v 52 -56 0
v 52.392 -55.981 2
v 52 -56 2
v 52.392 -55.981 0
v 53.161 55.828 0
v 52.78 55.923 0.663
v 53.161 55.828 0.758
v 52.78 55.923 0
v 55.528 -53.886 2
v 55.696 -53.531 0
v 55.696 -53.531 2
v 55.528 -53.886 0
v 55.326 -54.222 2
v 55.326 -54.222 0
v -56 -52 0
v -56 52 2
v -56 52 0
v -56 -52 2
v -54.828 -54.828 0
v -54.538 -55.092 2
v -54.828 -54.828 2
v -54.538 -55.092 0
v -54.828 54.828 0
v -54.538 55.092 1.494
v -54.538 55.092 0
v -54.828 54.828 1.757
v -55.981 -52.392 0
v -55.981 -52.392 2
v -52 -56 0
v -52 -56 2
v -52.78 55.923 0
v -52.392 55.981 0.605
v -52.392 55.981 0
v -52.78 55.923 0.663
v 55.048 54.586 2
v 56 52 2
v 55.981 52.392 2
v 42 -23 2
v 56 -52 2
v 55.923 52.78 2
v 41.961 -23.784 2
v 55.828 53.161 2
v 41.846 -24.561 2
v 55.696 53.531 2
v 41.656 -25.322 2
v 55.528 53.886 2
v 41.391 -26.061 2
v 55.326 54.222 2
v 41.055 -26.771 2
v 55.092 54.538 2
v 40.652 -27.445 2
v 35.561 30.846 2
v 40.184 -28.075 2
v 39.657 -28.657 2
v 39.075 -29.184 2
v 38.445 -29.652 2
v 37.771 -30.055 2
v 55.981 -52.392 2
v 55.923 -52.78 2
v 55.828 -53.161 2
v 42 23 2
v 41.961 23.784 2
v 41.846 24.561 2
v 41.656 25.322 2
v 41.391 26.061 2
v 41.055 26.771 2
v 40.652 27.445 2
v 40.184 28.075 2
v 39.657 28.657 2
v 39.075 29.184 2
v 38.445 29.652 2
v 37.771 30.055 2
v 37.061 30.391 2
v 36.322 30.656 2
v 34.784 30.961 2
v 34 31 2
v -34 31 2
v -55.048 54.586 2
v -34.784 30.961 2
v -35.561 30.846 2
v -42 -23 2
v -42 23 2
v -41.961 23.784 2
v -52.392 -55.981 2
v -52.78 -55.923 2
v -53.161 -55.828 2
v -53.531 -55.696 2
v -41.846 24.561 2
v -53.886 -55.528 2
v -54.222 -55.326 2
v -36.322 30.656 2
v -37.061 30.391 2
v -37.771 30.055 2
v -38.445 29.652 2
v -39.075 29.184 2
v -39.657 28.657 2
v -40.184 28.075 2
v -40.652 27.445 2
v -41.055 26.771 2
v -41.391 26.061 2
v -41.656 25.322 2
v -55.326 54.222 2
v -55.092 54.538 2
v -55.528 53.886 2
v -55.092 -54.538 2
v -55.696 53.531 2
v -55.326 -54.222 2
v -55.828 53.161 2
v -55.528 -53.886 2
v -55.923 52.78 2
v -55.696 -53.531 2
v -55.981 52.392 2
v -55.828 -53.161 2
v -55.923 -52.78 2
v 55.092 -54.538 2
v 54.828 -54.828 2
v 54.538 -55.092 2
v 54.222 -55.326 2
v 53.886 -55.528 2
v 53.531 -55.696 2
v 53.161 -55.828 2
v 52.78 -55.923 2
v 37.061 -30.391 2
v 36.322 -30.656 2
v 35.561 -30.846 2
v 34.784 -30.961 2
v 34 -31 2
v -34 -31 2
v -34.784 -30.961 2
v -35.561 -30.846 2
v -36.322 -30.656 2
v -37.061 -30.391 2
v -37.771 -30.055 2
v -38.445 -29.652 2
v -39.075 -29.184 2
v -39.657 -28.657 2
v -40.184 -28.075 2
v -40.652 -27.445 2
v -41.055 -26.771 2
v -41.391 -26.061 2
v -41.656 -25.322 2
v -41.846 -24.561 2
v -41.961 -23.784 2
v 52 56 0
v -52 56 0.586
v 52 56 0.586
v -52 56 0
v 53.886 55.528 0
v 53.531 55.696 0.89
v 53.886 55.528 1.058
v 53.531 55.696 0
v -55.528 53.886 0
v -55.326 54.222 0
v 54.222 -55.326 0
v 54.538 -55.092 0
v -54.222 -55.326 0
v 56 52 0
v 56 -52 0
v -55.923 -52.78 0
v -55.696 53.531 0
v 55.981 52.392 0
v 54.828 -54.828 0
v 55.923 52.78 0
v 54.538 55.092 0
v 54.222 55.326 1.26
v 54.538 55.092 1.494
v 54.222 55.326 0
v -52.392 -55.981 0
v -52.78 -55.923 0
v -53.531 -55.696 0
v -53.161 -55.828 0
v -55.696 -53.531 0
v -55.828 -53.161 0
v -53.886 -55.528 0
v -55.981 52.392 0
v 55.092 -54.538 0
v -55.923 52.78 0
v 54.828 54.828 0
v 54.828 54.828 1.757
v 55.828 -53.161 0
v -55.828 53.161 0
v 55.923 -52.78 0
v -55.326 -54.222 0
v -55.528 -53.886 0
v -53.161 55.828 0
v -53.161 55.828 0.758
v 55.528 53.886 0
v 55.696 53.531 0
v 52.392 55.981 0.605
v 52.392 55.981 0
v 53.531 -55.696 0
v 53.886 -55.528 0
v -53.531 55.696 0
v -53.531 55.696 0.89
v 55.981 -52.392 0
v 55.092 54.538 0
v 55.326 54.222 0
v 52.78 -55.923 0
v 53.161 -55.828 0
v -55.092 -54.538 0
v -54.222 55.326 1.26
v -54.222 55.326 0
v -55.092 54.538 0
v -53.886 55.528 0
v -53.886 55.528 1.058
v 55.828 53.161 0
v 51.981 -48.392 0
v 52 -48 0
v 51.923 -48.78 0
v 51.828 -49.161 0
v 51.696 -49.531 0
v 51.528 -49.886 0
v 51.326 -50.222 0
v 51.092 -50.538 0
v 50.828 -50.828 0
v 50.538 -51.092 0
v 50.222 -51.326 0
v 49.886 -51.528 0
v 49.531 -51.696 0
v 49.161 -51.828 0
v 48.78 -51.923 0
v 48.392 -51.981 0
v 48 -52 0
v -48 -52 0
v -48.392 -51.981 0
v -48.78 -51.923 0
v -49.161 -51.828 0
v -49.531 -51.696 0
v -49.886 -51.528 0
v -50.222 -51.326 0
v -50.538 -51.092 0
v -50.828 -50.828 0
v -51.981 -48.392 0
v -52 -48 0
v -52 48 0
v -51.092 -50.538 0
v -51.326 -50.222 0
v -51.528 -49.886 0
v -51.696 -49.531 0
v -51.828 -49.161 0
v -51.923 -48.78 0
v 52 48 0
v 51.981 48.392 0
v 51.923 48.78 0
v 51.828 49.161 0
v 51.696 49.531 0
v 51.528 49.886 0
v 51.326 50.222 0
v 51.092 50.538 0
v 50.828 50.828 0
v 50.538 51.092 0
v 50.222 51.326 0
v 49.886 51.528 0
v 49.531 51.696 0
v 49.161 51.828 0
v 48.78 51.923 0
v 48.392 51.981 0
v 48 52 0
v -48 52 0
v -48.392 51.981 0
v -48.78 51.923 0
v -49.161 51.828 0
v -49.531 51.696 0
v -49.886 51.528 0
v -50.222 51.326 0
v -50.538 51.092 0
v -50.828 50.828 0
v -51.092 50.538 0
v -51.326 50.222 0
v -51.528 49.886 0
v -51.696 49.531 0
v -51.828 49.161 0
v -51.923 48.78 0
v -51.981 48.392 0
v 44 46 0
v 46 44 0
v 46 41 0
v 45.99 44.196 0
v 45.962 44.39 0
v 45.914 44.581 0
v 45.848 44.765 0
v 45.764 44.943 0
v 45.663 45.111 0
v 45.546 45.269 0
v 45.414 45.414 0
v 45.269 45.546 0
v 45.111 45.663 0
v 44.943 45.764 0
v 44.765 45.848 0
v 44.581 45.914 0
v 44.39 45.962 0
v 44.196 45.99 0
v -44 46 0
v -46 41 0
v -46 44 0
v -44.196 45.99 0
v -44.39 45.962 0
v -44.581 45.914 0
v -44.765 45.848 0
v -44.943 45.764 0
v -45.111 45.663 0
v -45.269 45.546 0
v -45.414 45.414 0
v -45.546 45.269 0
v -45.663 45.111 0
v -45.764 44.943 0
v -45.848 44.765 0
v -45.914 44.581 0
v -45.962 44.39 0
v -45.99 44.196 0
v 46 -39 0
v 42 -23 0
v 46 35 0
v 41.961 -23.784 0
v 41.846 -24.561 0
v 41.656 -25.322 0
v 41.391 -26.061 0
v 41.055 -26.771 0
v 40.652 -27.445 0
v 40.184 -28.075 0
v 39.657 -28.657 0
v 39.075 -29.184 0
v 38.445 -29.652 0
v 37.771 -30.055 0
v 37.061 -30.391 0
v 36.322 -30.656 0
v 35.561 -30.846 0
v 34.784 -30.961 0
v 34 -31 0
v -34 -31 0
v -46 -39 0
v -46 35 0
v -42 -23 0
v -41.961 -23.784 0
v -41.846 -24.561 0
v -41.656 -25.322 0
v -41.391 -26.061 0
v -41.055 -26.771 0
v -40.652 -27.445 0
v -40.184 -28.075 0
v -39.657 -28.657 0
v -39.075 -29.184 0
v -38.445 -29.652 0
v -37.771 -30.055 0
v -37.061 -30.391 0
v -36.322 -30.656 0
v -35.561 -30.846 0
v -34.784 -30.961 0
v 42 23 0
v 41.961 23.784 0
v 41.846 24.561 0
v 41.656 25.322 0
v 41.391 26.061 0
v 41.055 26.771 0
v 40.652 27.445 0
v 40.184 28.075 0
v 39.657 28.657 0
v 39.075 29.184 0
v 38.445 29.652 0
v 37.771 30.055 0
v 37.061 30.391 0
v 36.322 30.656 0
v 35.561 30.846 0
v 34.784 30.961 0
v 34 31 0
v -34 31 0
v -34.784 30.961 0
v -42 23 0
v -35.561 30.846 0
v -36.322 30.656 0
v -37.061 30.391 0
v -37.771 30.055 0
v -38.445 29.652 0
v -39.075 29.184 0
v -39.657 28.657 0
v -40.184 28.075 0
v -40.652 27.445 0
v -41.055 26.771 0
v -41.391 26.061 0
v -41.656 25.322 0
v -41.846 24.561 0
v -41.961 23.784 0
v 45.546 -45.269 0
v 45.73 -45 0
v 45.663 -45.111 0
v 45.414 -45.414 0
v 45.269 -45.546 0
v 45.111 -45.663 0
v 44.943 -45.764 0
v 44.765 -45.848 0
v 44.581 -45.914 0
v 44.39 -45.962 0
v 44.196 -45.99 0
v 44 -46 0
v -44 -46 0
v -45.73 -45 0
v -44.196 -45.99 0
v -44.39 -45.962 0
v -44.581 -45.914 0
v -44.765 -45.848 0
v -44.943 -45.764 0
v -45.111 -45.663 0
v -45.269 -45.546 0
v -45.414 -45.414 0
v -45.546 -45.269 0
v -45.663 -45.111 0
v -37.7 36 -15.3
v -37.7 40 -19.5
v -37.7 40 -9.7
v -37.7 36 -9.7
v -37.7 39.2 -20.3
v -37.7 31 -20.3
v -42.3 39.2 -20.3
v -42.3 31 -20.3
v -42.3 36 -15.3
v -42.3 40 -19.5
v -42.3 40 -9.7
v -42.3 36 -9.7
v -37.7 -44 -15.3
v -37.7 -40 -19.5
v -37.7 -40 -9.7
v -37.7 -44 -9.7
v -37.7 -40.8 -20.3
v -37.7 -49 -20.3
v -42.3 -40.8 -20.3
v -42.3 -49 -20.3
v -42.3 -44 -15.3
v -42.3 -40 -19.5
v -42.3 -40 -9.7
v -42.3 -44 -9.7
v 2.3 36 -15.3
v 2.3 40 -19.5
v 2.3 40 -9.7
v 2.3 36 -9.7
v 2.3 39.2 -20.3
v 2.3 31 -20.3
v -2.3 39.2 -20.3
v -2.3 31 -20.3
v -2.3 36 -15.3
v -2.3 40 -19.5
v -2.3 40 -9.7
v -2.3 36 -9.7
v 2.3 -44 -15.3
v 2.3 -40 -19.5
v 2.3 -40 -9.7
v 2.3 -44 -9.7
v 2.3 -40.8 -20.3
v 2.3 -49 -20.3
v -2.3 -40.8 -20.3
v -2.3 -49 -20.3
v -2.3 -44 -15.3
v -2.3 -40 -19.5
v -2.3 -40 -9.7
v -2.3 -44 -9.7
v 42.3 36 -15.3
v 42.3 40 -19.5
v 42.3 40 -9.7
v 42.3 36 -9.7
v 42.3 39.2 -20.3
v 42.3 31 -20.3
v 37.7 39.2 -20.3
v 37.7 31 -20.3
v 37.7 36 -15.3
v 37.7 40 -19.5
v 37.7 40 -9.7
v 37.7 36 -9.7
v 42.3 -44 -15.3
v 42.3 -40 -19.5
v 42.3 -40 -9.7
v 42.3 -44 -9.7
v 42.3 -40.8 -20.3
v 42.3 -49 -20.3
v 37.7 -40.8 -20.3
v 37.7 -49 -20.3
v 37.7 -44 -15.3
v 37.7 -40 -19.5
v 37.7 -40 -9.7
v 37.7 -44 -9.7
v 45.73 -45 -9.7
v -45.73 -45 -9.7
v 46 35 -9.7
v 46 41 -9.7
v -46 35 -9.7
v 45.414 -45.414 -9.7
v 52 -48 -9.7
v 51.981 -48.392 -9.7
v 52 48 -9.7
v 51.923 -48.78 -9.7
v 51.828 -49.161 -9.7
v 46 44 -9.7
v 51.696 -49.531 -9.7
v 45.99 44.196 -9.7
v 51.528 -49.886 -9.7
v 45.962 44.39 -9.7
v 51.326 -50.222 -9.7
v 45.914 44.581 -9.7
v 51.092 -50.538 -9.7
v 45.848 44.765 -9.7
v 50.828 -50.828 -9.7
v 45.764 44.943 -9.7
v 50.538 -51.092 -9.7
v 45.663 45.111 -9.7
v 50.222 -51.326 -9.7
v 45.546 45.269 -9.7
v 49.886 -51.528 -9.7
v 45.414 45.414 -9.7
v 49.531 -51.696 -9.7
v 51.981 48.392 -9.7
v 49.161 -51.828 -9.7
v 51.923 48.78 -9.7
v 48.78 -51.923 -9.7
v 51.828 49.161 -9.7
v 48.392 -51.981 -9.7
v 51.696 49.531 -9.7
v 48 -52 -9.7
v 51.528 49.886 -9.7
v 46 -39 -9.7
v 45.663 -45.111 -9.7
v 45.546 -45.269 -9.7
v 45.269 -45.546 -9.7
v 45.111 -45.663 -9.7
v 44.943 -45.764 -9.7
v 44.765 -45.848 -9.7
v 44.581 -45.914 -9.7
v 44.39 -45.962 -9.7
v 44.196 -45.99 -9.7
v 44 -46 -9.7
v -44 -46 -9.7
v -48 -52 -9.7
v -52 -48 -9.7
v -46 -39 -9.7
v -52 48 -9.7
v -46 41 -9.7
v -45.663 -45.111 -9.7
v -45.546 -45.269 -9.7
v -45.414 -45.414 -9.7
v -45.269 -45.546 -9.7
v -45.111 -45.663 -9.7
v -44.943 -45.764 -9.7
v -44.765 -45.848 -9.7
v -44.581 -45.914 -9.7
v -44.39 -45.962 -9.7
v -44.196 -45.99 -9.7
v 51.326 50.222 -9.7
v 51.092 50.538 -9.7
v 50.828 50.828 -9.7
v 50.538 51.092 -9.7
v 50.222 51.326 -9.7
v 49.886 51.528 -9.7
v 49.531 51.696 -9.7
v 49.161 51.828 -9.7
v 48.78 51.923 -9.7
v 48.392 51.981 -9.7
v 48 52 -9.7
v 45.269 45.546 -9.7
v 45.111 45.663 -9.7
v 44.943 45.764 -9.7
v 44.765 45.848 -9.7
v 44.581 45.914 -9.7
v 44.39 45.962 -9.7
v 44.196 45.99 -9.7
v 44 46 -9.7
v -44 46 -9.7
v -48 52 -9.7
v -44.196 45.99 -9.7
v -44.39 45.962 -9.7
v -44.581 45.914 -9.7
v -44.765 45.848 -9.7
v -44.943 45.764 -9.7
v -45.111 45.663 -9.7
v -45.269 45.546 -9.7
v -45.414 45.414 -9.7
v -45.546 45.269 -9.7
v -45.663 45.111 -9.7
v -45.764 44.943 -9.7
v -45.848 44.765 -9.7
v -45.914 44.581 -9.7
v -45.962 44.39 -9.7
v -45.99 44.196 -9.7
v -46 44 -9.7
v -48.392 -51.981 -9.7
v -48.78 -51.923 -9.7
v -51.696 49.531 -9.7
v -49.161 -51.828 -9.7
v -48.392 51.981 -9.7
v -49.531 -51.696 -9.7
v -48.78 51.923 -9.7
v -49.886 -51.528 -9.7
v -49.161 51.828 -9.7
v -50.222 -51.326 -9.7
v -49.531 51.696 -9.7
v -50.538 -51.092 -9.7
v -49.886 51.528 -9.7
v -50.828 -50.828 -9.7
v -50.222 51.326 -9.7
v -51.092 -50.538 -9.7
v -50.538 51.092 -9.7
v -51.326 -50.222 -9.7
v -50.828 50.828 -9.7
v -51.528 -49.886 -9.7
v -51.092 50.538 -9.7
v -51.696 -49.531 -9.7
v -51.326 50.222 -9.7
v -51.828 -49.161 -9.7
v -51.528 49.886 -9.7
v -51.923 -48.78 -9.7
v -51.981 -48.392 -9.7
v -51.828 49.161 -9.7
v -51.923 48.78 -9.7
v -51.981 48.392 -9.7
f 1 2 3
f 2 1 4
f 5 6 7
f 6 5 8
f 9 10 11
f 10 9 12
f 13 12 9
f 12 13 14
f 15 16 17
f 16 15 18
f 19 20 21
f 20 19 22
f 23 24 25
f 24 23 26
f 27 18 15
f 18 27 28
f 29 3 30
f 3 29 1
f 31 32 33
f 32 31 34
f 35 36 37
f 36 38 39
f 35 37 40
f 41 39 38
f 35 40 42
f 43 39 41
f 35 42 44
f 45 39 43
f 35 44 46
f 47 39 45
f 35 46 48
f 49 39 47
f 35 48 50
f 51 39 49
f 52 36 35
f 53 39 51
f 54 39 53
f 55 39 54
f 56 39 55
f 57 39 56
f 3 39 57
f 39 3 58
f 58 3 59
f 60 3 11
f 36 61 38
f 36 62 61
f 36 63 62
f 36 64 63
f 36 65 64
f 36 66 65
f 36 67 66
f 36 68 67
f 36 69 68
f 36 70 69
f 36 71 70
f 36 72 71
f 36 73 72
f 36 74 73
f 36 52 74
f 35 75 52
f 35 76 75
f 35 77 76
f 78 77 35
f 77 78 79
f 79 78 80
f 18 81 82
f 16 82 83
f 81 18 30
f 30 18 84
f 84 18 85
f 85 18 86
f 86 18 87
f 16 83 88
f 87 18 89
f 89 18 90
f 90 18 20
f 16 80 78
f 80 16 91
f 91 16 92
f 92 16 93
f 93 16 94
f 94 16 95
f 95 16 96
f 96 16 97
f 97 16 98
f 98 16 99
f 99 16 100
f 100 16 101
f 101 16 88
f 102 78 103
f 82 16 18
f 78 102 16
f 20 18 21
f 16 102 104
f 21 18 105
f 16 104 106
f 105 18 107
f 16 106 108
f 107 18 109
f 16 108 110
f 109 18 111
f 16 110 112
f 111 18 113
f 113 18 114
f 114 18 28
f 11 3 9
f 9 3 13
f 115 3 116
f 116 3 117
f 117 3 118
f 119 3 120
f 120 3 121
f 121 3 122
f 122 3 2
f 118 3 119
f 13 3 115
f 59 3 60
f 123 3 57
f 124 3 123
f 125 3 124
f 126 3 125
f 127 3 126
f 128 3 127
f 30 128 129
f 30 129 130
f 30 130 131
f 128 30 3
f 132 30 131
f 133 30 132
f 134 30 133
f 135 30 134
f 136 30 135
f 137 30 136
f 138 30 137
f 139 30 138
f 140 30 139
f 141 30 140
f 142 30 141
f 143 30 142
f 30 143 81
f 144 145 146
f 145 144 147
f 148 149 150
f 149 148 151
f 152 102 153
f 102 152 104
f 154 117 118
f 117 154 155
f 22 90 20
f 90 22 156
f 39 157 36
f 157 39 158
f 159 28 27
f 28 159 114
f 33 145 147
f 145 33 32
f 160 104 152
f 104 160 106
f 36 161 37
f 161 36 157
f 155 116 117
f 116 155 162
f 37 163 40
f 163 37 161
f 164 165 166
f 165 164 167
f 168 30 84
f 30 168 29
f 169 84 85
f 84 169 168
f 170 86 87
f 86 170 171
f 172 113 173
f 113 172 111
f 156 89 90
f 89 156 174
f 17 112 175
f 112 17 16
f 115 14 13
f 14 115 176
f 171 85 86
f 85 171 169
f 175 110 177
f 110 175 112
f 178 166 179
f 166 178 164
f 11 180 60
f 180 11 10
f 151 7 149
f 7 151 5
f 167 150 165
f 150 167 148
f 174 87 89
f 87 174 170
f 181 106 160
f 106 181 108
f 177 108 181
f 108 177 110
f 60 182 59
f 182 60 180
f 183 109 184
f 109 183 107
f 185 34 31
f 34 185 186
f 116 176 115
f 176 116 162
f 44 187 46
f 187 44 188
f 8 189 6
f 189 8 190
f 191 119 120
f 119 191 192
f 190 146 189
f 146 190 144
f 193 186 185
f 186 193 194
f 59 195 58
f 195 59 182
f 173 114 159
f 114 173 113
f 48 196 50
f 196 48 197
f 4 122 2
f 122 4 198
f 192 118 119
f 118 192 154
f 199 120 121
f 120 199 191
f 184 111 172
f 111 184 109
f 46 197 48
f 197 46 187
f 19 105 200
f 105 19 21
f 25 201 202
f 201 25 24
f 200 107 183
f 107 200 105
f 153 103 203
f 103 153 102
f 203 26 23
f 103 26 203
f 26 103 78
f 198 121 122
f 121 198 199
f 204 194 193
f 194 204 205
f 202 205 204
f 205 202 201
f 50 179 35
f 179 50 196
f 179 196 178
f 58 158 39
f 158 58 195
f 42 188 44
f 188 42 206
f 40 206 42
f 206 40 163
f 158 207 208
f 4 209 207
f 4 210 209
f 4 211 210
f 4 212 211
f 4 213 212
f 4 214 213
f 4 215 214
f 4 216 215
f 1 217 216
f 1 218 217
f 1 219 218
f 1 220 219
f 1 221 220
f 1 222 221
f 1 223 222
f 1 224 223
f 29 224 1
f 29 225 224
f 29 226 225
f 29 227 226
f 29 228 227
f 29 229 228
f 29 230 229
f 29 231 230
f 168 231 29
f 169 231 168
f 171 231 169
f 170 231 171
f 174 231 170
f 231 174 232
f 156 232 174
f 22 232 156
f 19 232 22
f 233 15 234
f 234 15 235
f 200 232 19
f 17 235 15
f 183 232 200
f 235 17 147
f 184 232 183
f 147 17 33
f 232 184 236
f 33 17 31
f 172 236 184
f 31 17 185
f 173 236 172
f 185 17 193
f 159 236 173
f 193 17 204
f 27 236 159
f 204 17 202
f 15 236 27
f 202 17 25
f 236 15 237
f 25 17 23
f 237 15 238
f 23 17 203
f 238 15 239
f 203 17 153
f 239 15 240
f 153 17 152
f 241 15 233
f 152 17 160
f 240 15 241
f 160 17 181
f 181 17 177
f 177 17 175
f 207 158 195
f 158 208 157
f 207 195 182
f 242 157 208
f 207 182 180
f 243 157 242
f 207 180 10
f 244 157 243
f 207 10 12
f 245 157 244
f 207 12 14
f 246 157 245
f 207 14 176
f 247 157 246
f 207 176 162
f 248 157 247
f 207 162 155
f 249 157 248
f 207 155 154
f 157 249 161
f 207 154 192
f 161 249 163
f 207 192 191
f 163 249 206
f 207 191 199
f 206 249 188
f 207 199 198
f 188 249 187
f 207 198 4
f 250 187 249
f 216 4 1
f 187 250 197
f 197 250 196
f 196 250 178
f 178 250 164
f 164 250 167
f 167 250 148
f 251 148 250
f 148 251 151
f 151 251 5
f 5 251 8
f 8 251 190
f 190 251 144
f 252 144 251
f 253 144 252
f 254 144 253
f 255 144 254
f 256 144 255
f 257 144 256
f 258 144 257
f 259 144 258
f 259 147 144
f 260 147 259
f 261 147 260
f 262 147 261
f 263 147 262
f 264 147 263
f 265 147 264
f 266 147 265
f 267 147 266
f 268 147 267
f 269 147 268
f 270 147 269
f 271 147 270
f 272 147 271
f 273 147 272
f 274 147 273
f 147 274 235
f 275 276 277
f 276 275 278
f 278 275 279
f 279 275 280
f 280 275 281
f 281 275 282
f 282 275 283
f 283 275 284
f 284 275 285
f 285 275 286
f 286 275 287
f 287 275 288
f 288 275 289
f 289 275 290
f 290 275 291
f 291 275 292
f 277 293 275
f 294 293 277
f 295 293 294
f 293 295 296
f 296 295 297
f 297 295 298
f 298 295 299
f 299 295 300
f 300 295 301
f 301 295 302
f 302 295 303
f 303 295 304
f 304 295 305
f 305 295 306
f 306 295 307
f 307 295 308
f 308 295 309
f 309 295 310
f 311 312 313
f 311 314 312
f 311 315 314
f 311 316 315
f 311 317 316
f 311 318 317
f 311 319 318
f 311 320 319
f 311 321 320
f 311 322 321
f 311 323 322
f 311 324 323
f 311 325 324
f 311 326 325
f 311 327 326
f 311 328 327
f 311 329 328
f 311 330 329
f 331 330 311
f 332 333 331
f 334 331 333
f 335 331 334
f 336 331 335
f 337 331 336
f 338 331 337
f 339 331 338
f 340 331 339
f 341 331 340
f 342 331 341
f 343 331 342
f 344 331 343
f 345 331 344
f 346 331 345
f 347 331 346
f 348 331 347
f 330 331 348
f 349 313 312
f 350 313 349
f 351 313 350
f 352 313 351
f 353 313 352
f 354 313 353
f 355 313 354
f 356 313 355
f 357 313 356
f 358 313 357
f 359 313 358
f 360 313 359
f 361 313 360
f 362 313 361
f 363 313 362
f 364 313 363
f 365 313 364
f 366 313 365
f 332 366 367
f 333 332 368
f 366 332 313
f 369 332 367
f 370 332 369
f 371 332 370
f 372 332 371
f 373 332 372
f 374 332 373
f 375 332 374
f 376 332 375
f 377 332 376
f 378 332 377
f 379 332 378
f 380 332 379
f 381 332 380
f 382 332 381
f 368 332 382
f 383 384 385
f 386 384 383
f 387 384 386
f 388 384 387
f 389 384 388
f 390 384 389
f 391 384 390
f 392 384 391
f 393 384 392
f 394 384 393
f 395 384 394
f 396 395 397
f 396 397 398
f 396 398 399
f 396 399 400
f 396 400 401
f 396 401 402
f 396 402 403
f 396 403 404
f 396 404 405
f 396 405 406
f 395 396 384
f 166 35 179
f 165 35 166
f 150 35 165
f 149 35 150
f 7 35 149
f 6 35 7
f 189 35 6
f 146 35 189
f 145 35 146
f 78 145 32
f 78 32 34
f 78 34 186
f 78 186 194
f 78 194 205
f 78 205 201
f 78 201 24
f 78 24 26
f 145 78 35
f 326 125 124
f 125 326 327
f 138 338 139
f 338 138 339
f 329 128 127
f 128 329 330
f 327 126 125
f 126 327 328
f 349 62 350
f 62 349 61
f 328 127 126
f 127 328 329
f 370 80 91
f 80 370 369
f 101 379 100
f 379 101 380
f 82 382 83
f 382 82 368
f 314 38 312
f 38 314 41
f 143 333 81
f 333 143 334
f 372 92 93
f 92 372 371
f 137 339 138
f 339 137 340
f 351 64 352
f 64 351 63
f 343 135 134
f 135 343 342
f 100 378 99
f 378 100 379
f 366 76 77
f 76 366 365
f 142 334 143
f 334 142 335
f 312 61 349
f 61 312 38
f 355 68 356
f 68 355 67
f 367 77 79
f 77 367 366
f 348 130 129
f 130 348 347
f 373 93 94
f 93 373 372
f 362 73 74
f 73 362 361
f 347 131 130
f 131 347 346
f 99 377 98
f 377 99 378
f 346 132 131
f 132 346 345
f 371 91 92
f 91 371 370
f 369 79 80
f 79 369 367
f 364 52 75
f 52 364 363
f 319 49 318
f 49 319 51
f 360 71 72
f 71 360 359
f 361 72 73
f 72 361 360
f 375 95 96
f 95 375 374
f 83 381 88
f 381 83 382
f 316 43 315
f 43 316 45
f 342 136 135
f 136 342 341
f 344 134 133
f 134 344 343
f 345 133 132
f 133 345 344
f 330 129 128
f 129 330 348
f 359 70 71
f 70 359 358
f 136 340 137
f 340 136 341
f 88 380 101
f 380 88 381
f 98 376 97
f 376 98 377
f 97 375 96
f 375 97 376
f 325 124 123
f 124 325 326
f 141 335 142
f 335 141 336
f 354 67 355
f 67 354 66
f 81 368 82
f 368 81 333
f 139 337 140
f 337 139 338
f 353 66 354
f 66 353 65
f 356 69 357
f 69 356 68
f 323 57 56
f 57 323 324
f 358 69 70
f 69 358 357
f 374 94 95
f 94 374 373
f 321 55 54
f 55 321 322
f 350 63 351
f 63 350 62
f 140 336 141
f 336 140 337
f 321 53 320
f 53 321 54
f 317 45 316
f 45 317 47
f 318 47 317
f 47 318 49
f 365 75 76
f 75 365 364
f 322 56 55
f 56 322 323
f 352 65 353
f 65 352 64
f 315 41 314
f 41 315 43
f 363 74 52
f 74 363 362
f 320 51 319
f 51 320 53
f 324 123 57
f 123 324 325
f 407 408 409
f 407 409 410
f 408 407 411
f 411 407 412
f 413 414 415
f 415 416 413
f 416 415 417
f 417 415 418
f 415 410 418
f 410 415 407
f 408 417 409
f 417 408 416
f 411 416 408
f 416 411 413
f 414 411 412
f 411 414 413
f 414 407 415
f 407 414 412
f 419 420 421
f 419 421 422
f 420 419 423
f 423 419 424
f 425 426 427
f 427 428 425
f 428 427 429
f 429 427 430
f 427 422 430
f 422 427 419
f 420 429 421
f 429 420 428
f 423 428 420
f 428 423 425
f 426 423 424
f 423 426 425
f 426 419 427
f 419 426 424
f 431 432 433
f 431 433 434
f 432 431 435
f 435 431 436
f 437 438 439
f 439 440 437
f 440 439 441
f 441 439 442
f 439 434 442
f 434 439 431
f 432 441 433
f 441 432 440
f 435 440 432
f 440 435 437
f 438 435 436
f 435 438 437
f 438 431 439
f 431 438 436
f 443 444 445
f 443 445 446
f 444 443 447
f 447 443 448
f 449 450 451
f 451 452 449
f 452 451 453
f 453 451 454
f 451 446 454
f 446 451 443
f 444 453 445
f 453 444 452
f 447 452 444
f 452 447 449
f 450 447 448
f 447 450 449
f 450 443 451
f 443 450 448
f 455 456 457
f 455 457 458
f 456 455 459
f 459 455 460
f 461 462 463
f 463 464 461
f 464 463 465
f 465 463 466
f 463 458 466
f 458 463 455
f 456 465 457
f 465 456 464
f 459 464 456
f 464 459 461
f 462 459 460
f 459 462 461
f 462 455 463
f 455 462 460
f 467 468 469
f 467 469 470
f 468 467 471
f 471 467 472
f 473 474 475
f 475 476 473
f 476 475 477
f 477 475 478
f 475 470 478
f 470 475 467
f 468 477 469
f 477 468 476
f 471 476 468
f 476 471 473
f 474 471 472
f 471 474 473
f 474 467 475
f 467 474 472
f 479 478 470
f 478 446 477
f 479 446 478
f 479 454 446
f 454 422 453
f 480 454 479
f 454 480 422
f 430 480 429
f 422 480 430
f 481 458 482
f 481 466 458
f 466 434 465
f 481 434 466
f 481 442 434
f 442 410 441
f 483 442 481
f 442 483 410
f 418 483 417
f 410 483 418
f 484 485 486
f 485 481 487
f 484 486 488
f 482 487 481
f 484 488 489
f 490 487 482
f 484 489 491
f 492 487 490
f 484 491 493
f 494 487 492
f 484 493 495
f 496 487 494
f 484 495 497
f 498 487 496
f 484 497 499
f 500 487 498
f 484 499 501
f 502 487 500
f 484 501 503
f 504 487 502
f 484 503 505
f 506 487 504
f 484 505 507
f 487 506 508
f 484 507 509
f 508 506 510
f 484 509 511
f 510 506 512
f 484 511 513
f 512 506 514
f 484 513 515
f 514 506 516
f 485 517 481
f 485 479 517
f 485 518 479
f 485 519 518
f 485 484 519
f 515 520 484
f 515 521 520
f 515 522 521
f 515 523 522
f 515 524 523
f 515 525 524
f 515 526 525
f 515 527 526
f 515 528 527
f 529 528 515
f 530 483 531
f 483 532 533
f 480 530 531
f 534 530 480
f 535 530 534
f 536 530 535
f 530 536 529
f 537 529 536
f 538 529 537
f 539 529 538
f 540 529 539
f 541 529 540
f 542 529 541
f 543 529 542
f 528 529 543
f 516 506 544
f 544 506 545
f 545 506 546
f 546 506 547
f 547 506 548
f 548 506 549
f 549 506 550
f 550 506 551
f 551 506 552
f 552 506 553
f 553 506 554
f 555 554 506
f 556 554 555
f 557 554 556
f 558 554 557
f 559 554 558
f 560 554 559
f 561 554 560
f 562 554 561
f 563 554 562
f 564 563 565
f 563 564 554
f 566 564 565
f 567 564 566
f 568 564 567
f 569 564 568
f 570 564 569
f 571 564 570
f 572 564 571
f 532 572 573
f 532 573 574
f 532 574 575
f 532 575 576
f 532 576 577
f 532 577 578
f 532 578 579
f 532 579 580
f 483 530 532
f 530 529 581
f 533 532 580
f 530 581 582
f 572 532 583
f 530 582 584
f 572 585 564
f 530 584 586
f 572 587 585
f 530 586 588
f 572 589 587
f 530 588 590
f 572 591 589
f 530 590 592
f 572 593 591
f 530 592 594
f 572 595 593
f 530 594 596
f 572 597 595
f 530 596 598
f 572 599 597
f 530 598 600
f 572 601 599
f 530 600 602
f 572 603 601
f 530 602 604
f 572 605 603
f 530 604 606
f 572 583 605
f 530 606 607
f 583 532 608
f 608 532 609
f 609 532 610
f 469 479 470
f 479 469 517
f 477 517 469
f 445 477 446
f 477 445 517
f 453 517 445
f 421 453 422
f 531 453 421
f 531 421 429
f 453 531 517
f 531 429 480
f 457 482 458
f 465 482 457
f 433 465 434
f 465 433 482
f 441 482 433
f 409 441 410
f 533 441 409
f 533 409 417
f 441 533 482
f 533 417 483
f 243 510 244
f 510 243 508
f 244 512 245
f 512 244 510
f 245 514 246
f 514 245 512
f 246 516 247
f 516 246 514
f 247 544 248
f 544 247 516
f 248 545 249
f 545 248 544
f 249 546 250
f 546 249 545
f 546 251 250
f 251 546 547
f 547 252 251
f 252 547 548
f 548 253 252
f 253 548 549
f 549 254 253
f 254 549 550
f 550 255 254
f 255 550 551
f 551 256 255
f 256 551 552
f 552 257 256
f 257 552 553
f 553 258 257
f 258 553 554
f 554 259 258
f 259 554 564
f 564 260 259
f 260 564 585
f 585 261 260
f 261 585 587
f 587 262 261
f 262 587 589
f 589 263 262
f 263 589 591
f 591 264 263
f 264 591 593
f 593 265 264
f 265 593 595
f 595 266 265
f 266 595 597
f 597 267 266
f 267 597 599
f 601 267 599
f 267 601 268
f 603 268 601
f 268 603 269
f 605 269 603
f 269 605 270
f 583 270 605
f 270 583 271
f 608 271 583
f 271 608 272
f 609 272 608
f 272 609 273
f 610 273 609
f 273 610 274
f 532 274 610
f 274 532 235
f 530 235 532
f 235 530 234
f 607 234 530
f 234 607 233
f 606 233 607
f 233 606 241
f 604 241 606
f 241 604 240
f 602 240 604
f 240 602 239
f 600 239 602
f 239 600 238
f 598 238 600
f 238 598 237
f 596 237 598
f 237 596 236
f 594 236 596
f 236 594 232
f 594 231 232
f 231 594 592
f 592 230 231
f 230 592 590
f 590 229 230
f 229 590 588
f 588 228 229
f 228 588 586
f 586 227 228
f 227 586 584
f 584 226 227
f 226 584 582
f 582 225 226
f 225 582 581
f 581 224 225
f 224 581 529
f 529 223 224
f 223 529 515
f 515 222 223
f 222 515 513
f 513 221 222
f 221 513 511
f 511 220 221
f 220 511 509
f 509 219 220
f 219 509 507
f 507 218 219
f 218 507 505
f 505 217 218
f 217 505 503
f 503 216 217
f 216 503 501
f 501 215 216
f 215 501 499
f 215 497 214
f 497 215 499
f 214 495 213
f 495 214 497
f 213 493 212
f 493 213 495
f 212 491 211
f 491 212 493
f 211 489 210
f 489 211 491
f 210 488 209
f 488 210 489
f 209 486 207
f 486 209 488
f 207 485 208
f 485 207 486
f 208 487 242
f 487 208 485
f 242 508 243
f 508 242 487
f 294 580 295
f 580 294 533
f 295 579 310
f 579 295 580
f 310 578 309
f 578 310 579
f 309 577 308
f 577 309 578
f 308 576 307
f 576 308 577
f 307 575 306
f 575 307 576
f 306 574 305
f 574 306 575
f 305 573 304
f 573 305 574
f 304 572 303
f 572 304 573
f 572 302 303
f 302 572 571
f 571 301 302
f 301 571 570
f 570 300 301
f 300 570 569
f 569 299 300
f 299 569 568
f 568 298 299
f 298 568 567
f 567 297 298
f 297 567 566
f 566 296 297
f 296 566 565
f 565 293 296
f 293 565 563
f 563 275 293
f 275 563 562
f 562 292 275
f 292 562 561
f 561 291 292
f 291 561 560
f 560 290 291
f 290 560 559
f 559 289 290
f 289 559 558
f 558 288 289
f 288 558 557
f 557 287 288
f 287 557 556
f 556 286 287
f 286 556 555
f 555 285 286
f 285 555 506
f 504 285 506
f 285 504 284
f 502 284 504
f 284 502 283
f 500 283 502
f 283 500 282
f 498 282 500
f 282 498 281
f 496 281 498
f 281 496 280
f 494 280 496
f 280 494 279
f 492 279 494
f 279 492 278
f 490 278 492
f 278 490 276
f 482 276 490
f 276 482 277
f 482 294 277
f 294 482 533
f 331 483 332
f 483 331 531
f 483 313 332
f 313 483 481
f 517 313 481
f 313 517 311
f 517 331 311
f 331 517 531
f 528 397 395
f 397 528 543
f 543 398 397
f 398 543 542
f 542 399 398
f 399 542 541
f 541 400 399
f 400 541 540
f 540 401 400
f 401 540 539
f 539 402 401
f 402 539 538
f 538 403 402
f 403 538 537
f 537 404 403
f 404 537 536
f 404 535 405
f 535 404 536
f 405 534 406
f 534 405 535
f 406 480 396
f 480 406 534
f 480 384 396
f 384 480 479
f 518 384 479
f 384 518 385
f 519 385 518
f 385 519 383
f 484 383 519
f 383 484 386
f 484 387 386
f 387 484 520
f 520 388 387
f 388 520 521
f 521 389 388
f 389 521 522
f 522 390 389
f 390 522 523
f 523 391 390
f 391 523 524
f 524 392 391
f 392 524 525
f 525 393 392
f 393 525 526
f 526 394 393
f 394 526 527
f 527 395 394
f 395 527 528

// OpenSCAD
// =============================================================================
//  SKADIS mount kit for the rain "the101" 5G router
// =============================================================================
//
//  MOUNT TYPE (researched, then confirmed against the base photo and the Shopee
//  "Rain the101 Wall Mounting Bracket" listing):
//
//    the101 is a 230 x 230 x 56 mm rounded-square 5G CPE. Its underside has a
//    shallow square WELL ringed by moulded plastic retention TABS. A flat plate
//    slides in sideways and is captured under those tabs. There are no screw
//    bosses in the router and no VESA pattern on the router itself.
//
//    Interface numbers:
//      tab slot gap ......... 4.0 mm    (measured)
//      tab width ............ 12  mm    (measured)
//      OEM-style plate ...... 121 x 121 x 5.7 mm   (Shopee listing)
//                             -> 4.0 mm at the edges that pass under the tabs,
//                                5.7 mm across the raised centre pad, which
//                                also tells us the well is ~5.7 mm deep.
//      plate screw pattern .. 75 x 75 VESA on the "Vesa Compatible" variant.
//      BUILD TARGET ......... 112 x 112 x 2.0 mm, with a 104 mm standoff ring.
//                             Much thinner than the OEM plate - see tongue_t on
//                             the slop that 2.0 mm in a 4.0 mm slot leaves.
//
//    So: a SLIDE-IN CAPTIVE PLATE. This file rebuilds that plate with SKADIS
//    pegs on the back instead of wall screws.
//
//  SKADIS interface (IKEA pegboard):
//    slots 5.0 x 15.0 mm on a plain 40 mm rectangular grid, board 5.2 mm thick.
//    Accessories hang off the BOTTOM edge of a slot.
//
//  ORIENTATION - this matters:
//    Hang the bracket so the router is lowered DOWN onto the tongue, i.e. the
//    well's open side faces down once the router is up. Gravity then holds the
//    plate seated, so no latch or detent is needed. To remove, lift.
//
//  PARTS - pick with `part` below:
//    "bracket" - the slide-in captive plate. The real answer. Prints flat with
//                no supports.
//    "hooks"   - a pair of cradle hooks. Needs nothing but the published body
//                size, so it works even if your unit's well differs at all.
//    "gauge"   - 10 minute test print. Confirms the 4.0 mm slot and the 112 mm
//                well on YOUR unit before you commit to the bracket print.
// =============================================================================

/* [What to render] */
part = "bracket"; // [bracket:Slide-in plate, hooks:Cradle hooks, gauge:Tab gauge, all:All laid out]

/* [SKADIS board - leave alone for a genuine board] */
skadis_pitch = 40;    // slot grid pitch, both axes
slot_w       = 5.0;   // slot width
slot_h       = 15.0;  // slot height
board_t      = 5.2;   // pegboard thickness (use 3.0 for the thin variant)

/* [Printer fit tuning] */
peg_clear = 0.4;  // subtracted from slot_w to get peg width. Raise if pegs bind.
peg_gap   = 0.4;  // slop behind the board before the barb bites

/* [Peg shape] */
neck_h = 4.0;   // peg height sitting inside the slot
barb_h = 5.0;   // how far the barb drops behind the board
barb_d = 5.0;   // barb depth. Keep == barb_h: that is what makes the barb's
                // underside a 45 deg self-supporting face.

/* [Router interface - measured] */
tab_gap    = 4.0;    // the 4 mm slot under the retention tabs
tab_w      = 12.0;   // the 12 mm tab width
plate_sq   = 112.0;  // build target. The OEM-style bracket is 121 x 121 x 5.7,
                     // but 112 is what this unit's well takes.
well_depth = 5.7;    // well floor to the router's outer rim. Over-estimating
                     // this is safe - it only widens the air gap.
tongue_fit = 0;      // extra clearance off plate_sq. Raise if it binds going in.

/* [Slide-in bracket] */
tongue_t = 2.0;   // plate thickness. NOTE this is still under the 4.0 mm tab
                  // slot, so the plate has ~2.0 mm of slop and the router can
                  // rock slightly. Raise toward 3.8 for a snug fit.
air_gap  = 6.0;   // clear air behind the router's vented underside. The whole
                  // point of the standoff ribs: mounted vertically, that face
                  // would otherwise sit flat on the fibreboard.
rib_w    = 6.0;   // standoff rib width. A rib's stiffness goes as its HEIGHT
                  // cubed and only linearly with width, so the 9.7 mm standoff
                  // is doing the work - 10 mm of width was just mass. 6 mm still
                  // leaves 1 mm either side of a peg neck.

/* [Weight saving] */
lighten    = true;  // cut the dead centre out of the plate
light_edge = 4.0;   // plate left between that cutout and the ribs
rib_in   = 4.0;   // perimeter rib inset from the plate edge, i.e. the width of
                  // the bare lip around the outside of the plate. Also sets the
                  // ring's outer size: plate_sq - 2*rib_in = 104.
lead_in  = 1.0;   // 45 deg chamfer on the tongue's leading (top) edge
peg_cols = [-40, 0, 40];   // peg x positions. Spacings must be multiples of 40.
peg_rows = [40, -40];      // peg y positions. Spacings must be multiples of 40.

/* [Cradle hooks] */
body_t       = 56;   // the101 body thickness, from rain's spec
hook_plate_w = 30;   // backplate width
hook_plate_h = 80;   // backplate height: 40 mm peg column + gusset tail below
hook_plate_t = 5;    // backplate thickness
hook_shelf_d = 62;   // shelf depth, body_t plus a little
hook_shelf_t = 5;    // shelf thickness
hook_lip_h   = 22;   // front lip, stops the router tipping off
hook_lip_t   = 5;    // front lip thickness
hook_gusset  = 24;   // web height. The backplate runs on DOWN past the shelf by
                     // this much so the web has something to tie into - a web
                     // above the shelf would foul the router body.

/* [Gauge] */
gauge_steps = [3.4, 3.6, 3.8, 4.0, 4.2, 4.4];
gauge_reach = 26;   // how far each finger sticks out

$fn = 64;

// Standoff needed at the plate's back face. The plate sits 2.0 mm into a 5.7 mm
// well, so the router's rim already hangs 3.7 mm proud of the plate's back and
// the ribs have to clear that before the air gap even starts.
standoff = air_gap + (well_depth - tongue_t);

// =============================================================================
//  SKADIS peg
// =============================================================================
//  Local origin sits on the plate's BACK face, neck top at y = 0. The peg grows
//  into -Z: first across the standoff gap, then through the board, then the barb.
//
//  Fitting: push all pegs in near the top of their slots, then drop the part
//  ~11 mm. The neck lands on the slot's bottom edge and the barb sits behind the
//  board. neck_h + barb_h = 9 mm, comfortably inside the 15 mm slot.
//
//  Printing: with the plate's front face on the bed (pegs up) the barb's only
//  overhang is its 45 deg ramp, so this needs no supports.

module skadis_peg(so = 0) {
    w   = slot_w - peg_clear;         // 4.6 in a 5.0 slot
    nd  = so + board_t + peg_gap;     // neck depth: standoff, then through
    tot = nd + barb_d;                // total protrusion behind the plate
    ch  = 0.8;                        // lead-in chamfer on the back top corner

    pts = [
        [0,           0                ],
        [-(tot - ch),  0               ],
        [-tot,        -ch              ],
        [-tot,        -(neck_h + barb_h)],  // barb tip: deepest and lowest
        [-nd,         -neck_h          ],   // 45 deg ramp back up to the neck
        [0,           -neck_h          ],
    ];

    translate([w / 2, 0, 0])
        rotate([0, -90, 0])
            linear_extrude(height = w)
                polygon(pts);
}

// rounded rectangle / square helpers
module rrect(w, h, r) {
    offset(r = r) offset(r = -r) square([w, h], center = true);
}
module rsq(size, r) { rrect(size, size, r); }

// =============================================================================
//  Part 1: slide-in captive plate
// =============================================================================
//  Plate front face (z = tongue_t) lies against the well floor and the tabs grip
//  its edges. Standoff ribs and pegs grow into -Z toward the pegboard.
//
//  Deliberately ONE flat plate rather than a stepped plate with an oversailing
//  slab: a step would leave an unsupported ledge on the bed. This way the whole
//  thing prints face-down with nothing but the self-supporting peg barbs above.

module slide_in_bracket() {
    sq   = plate_sq - tongue_fit;              // 112.0
    lead = min(lead_in, tongue_t * 0.6);       // never chamfer the plate away

    // The dead centre of the plate: everything inside the ring and between the
    // two cross ribs. No load path runs through it, so it is the one place mass
    // can leave without costing anything.
    ring_in = sq - 2 * rib_in - 2 * rib_w;                      // ring's bore
    rib_in_edge = abs(peg_rows[0]) - neck_h / 2 - rib_w / 2;    // cross rib inner edge
    win_x = ring_in - 2 * light_edge;
    win_y = 2 * rib_in_edge - 2 * light_edge;

    // ---- plate, with a chamfered leading edge on +Y so it feeds under the
    //      tabs instead of butting into them
    difference() {
        linear_extrude(height = tongue_t)
            rsq(sq, 4);

        translate([0, sq / 2, tongue_t])
            rotate([45, 0, 0])
                translate([-sq, -lead, -lead])
                    cube([sq * 2, lead * 2, lead * 2]);

        // weight-saving window. The tabs grip the perimeter and the load runs
        // perimeter -> ring -> cross ribs -> pegs, all of it outside this hole,
        // so it costs no strength. It also vents the well.
        if (lighten)
            translate([0, 0, -1])
                linear_extrude(height = tongue_t + 2)
                    rrect(win_x, win_y, 8);
    }

    // ---- standoff ribs on the back: a perimeter ring plus a cross rib through
    //      each peg row. The ring carries the load onto the board and stiffens
    //      the plate; the cross ribs are the pegs' roots.
    translate([0, 0, -standoff])
        linear_extrude(height = standoff) {
            // perimeter ring
            difference() {
                rsq(sq - 2 * rib_in, 4);
                rsq(sq - 2 * rib_in - 2 * rib_w, 2);
            }
            // cross rib centred on each peg row's neck
            for (y = peg_rows)
                translate([0, y - neck_h / 2, 0])
                    square([sq - 2 * rib_in, rib_w], center = true);
        }

    // ---- pegs
    for (x = peg_cols, y = peg_rows)
        translate([x, y, 0])
            skadis_peg(standoff);
}

// =============================================================================
//  Part 2: cradle hooks
// =============================================================================
//  No router measurements needed at all. Two of these, 160 mm apart (4 slot
//  columns), carry the 230 mm wide body. The 62 mm shelf takes the full 56 mm
//  depth and the lip stops it tipping off the front.
//
//  PRINT: lay it on its side, the 30 mm flat face on the bed. The body then
//  extrudes in the bed plane with no overhangs at all. The two pegs are the only
//  exception - give them tree supports.

module cradle_hook() {
    w  = hook_plate_w;
    h  = hook_plate_h;
    t  = hook_plate_t;
    st = hook_shelf_t;
    yb = -h / 2;                // backplate bottom edge
    ys = yb + hook_gusset;      // shelf underside, sits a gusset's height up

    union() {
        // backplate
        translate([-w / 2, yb, 0])
            cube([w, h, t]);

        // shelf. Router's bottom edge lands on its top face, at ys + st.
        translate([-w / 2, ys, t])
            cube([w, st, hook_shelf_d]);

        // front lip, 1 mm clear of the router's front face
        translate([-w / 2, ys, t + hook_shelf_d - hook_lip_t])
            cube([w, st + hook_lip_h, hook_lip_t]);

        // triangular web from the shelf's UNDERSIDE down the backplate
        translate([w / 2, 0, 0])
            rotate([0, -90, 0])
                linear_extrude(height = w)
                    polygon([
                        [t,               ys],
                        [t,               yb],
                        [t + hook_gusset, ys],
                    ]);
    }

    // two pegs in one column, 40 mm apart. A single peg would let the hook swing
    // about its own axis; two rows lock it.
    for (y = [skadis_pitch / 2, -skadis_pitch / 2])
        translate([0, y, 0])
            skadis_peg(0);
}

// =============================================================================
//  Part 3: tab gauge
// =============================================================================
//  A comb of 12 mm fingers in 0.2 mm steps, matching the tab width. Slide each
//  under one of the router's retention tabs. The thickest finger that goes in
//  without forcing is your real slot gap: set tongue_t to that minus 0.2.
//
//  The 100 mm rule along the back measures the well, to check the 121 mm
//  plate_sq figure against your own unit.

module tab_gauge() {
    spine_t = 5;
    pitch   = tab_w + 6;
    n       = len(gauge_steps);
    span    = n * pitch;

    // spine
    translate([-span / 2, -12, 0])
        cube([span, 12, spine_t]);

    for (i = [0 : n - 1]) {
        t = gauge_steps[i];
        x = -span / 2 + i * pitch + 3;

        // finger
        translate([x, 0, 0])
            cube([tab_w, gauge_reach, t]);

        // embossed thickness label on the spine
        translate([x + tab_w / 2, -6, spine_t])
            linear_extrude(height = 0.6)
                text(str(t), size = 4.5, halign = "center", valign = "center");
    }

    // 100 mm rule with 10 mm ticks along the back edge
    translate([-50, -18, 0]) {
        cube([100, 6, spine_t]);
        for (i = [0 : 10])
            translate([i * 10 - 0.6, -4, 0])
                cube([1.2, 4, spine_t]);
    }
}

// =============================================================================
//  Render
// =============================================================================

if      (part == "bracket") slide_in_bracket();
else if (part == "hooks")   cradle_hook();
else if (part == "gauge")   tab_gauge();
else if (part == "all") {
    slide_in_bracket();
    translate([-120, 0, 0]) cradle_hook();
    translate([0, -120, 0]) tab_gauge();
}
